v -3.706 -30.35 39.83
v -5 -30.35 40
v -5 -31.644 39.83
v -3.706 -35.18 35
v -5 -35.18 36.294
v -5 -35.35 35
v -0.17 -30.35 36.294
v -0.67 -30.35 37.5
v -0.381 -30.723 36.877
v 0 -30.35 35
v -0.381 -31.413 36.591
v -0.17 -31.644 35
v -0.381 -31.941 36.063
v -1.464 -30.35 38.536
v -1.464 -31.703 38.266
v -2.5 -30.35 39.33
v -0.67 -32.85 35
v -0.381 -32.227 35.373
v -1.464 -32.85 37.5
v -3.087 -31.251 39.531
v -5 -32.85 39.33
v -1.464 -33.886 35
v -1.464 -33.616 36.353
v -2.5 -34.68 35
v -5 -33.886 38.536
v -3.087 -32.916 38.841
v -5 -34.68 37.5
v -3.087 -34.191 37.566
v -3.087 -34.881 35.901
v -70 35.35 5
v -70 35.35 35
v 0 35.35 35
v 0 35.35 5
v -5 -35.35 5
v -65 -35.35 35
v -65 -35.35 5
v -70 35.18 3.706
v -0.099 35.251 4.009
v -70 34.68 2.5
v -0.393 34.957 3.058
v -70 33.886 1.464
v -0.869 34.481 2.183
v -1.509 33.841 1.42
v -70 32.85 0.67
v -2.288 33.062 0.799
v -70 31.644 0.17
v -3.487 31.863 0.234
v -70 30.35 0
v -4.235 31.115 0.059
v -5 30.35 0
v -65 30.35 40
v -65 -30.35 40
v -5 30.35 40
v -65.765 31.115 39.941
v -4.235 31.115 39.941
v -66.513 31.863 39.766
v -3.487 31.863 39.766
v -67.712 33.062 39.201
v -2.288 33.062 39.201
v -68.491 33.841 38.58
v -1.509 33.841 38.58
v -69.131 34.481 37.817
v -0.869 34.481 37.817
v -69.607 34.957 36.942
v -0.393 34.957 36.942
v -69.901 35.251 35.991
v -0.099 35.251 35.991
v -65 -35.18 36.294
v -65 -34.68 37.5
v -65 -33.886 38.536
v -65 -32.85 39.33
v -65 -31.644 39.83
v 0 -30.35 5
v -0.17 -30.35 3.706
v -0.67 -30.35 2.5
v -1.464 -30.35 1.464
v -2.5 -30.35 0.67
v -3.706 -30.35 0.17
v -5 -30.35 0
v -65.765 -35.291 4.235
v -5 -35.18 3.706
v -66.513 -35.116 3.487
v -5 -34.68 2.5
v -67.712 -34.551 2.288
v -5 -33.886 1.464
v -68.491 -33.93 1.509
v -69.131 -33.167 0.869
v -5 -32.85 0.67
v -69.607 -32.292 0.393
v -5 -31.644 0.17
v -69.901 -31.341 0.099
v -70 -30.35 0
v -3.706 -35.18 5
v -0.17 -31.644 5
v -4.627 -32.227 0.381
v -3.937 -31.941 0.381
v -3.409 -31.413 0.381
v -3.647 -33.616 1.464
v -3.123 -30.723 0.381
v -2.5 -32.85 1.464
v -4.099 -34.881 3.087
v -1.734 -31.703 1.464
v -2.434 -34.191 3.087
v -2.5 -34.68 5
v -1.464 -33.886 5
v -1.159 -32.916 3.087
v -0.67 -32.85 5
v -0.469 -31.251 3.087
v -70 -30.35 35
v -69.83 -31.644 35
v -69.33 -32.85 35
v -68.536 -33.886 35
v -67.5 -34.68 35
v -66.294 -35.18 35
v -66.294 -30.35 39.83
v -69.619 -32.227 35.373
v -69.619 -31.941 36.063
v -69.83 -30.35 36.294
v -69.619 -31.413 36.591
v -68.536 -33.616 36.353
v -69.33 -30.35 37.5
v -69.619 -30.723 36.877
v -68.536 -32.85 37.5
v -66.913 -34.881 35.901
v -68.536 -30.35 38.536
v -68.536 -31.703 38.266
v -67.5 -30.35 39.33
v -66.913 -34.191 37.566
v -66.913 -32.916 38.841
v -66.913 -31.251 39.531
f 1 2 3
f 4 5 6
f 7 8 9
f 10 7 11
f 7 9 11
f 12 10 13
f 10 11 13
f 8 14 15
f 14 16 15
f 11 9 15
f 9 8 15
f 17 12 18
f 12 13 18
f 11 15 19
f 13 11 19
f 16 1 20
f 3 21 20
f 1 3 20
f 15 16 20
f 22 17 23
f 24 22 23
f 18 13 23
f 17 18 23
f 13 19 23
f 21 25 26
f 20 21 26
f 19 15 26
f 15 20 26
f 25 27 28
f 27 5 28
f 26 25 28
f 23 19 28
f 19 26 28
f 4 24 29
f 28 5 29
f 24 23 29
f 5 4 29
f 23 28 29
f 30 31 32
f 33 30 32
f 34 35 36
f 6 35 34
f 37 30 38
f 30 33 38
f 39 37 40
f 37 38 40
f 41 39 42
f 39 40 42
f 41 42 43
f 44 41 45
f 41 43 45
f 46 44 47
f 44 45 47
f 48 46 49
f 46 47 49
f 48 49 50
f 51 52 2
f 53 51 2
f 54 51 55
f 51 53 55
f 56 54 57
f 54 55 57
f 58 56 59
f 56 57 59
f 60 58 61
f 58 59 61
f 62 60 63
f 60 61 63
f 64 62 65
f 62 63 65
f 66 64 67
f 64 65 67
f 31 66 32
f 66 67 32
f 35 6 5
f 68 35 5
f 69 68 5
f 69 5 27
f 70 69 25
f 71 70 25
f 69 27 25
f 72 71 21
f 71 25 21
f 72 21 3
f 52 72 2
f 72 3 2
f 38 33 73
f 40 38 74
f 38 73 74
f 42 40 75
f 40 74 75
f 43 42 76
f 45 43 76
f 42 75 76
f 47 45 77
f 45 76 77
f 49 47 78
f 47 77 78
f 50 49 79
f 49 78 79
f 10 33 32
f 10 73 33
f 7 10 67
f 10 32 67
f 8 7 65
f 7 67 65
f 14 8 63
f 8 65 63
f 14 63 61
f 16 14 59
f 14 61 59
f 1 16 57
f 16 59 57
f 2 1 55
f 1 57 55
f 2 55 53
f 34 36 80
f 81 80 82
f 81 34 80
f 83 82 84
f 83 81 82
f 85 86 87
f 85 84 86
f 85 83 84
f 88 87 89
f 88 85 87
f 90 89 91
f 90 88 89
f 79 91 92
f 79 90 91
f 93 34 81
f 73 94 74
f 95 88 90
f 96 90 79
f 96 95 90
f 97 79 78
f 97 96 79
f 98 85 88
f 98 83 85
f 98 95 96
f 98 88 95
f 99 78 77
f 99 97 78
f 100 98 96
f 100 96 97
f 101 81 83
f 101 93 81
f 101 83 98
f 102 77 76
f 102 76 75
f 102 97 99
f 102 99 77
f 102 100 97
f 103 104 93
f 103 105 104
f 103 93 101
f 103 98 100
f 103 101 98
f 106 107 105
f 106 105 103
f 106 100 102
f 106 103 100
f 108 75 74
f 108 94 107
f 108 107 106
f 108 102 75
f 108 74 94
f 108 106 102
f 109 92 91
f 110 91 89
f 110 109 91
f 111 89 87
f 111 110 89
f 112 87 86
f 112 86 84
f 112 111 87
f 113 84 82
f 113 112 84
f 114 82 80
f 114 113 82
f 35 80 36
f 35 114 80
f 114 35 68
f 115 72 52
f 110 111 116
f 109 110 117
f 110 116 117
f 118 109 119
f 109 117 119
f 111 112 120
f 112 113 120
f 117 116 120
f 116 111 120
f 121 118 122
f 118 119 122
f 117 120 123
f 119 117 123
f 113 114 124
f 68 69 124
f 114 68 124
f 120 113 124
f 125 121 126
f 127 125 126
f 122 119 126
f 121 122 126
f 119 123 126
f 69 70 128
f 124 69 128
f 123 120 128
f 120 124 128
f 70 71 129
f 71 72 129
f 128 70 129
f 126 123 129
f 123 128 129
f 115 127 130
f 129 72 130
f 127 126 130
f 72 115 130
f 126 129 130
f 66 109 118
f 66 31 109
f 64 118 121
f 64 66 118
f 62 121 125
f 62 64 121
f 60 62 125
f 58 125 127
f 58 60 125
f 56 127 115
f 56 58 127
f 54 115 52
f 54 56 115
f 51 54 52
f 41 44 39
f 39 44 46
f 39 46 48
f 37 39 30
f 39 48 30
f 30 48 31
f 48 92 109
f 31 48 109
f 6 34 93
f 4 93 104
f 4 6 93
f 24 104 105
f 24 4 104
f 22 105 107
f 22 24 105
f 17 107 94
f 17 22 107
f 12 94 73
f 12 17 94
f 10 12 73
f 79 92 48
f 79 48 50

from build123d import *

# Parameters (mm, degrees)
F0_W     = 70
F0_H     = 40
F1_DEPTH = 35.35
F2_R     = 5


with BuildPart() as f1:
    # F0 (on Front) → F1 (new body, symmetric)
    with BuildSketch(Plane.XZ):
        with Locations((-35, 20)):
            Rectangle(F0_W, F0_H)
    extrude(amount=F1_DEPTH, both=True)

    # F2
    f2_edges = [f1.edges().sort_by_distance(p)[0] for p in [
        (-35, -35.35, 40),
        (0, 0, 40),
        (0, -35.35, 20),
        (-70, -35.35, 20),
        (-35, -35.35, 0),
        (-70, 0, 40),
        (-35, 35.35, 40),
        (0, 0, 0),
        (-35, 35.35, 0),
    ]]
    fillet(f2_edges, radius=F2_R)


solid = f1.part
